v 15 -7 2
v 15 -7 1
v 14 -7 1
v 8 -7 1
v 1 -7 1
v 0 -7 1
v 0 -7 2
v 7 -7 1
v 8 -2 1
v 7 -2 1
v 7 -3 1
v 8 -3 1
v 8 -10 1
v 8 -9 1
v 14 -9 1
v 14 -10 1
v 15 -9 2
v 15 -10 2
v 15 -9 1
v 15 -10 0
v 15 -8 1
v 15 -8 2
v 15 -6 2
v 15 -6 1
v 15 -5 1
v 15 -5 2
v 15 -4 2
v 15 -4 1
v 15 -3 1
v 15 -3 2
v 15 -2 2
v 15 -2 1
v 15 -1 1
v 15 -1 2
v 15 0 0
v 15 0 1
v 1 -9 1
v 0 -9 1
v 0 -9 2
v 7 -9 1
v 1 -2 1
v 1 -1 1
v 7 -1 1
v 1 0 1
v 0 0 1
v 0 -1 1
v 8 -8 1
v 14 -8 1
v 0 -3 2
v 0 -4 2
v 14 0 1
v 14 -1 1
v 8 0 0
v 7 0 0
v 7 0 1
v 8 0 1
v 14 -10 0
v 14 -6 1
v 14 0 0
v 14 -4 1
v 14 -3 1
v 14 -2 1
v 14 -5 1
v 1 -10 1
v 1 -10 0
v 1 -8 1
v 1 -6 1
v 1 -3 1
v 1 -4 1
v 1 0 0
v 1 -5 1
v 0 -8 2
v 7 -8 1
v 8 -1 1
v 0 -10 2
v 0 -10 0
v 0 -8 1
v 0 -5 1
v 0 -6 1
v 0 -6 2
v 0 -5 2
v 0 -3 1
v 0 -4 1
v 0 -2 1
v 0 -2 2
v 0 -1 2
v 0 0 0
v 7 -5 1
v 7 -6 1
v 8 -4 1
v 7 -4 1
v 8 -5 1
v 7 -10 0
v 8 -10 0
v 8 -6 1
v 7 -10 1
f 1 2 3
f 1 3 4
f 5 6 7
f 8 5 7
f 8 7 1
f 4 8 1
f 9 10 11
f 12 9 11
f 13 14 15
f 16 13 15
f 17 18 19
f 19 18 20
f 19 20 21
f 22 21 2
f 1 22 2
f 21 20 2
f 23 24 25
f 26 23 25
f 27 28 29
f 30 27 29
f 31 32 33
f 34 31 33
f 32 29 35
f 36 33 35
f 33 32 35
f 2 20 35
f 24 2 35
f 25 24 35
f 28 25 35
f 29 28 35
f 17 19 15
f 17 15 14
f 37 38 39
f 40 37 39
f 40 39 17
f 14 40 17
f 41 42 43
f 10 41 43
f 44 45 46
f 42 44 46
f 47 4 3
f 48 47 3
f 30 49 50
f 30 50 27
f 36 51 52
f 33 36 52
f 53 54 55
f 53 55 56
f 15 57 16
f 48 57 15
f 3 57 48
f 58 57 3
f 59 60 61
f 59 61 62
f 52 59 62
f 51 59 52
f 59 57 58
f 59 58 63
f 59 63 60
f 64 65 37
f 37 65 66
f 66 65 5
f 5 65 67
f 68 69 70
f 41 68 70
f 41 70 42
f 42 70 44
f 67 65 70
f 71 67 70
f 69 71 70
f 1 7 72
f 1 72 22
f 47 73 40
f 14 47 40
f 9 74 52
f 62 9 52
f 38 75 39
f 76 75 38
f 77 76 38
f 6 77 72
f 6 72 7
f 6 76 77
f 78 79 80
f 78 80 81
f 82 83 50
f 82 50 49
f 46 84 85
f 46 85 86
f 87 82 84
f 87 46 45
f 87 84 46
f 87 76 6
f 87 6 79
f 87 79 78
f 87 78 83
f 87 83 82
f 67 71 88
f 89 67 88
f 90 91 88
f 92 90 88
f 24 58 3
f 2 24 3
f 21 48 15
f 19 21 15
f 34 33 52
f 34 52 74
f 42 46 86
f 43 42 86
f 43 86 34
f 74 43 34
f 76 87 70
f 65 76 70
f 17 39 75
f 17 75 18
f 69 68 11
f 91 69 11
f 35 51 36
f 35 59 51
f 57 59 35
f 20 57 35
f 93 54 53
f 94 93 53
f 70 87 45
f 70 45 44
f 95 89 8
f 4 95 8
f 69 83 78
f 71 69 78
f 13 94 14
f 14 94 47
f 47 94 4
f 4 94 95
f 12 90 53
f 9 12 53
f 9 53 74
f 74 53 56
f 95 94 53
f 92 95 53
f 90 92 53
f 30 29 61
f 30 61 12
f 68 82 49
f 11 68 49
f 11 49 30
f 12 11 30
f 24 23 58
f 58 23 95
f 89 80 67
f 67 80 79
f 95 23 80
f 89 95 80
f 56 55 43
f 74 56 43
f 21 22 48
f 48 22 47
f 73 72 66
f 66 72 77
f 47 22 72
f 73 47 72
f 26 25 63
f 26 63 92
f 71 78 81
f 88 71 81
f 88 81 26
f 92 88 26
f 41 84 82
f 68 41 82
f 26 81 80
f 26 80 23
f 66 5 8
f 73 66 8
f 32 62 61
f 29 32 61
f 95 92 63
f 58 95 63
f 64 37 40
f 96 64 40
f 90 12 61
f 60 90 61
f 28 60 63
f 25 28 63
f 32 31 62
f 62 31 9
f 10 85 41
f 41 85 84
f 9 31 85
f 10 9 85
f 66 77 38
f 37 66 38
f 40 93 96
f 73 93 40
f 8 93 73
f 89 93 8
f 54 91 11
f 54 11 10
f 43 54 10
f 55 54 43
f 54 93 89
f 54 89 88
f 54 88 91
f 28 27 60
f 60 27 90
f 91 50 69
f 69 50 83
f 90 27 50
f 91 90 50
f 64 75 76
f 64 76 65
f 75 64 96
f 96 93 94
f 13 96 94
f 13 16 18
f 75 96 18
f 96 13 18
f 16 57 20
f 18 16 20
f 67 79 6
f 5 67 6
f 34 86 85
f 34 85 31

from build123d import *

# Parameters (mm, degrees)
F0_W     = 15
F0_H     = 10
F1_DEPTH = 2
F2_W     = 6
F2_H     = 1
F3_DEPTH = 25
F5_DEPTH = 25


with BuildPart() as f1:
    # F0 (on Top) → F1 (new body)
    with BuildSketch(Plane.XY):
        with Locations((7.5, -5)):
            Rectangle(F0_W, F0_H)
    extrude(amount=F1_DEPTH)

    # F2 (on Front) → F3 (cut)
    with BuildSketch(Plane.XZ):
        with Locations((4, 0.5)):
            Rectangle(F2_W, F2_H)
        with Locations((11, 0.5)):
            Rectangle(F2_W, F2_H)
    extrude(amount=F3_DEPTH, mode=Mode.SUBTRACT)

    # F4 (on face) → F5 (cut)
    with BuildSketch(Plane(origin=(0, 0, 0), x_dir=(0, -1, 0), z_dir=(-1, 0, 0))):
        Polygon((0, 3.5), (0, 2.235531), (0, 1), (1, 1), (1, 2), (2, 2), (2, 1), (3, 1), (3, 2), (4, 2), (4, 1), (5, 1), (5, 2), (6, 2), (6, 1), (7, 1), (7, 2), (8, 2), (8, 1), (9, 1), (9, 2), (10, 2), (10, 1), (10.680856, 1), (10.680856, 3.5), align=None)
    extrude(amount=-F5_DEPTH, mode=Mode.SUBTRACT)


solid = f1.part
